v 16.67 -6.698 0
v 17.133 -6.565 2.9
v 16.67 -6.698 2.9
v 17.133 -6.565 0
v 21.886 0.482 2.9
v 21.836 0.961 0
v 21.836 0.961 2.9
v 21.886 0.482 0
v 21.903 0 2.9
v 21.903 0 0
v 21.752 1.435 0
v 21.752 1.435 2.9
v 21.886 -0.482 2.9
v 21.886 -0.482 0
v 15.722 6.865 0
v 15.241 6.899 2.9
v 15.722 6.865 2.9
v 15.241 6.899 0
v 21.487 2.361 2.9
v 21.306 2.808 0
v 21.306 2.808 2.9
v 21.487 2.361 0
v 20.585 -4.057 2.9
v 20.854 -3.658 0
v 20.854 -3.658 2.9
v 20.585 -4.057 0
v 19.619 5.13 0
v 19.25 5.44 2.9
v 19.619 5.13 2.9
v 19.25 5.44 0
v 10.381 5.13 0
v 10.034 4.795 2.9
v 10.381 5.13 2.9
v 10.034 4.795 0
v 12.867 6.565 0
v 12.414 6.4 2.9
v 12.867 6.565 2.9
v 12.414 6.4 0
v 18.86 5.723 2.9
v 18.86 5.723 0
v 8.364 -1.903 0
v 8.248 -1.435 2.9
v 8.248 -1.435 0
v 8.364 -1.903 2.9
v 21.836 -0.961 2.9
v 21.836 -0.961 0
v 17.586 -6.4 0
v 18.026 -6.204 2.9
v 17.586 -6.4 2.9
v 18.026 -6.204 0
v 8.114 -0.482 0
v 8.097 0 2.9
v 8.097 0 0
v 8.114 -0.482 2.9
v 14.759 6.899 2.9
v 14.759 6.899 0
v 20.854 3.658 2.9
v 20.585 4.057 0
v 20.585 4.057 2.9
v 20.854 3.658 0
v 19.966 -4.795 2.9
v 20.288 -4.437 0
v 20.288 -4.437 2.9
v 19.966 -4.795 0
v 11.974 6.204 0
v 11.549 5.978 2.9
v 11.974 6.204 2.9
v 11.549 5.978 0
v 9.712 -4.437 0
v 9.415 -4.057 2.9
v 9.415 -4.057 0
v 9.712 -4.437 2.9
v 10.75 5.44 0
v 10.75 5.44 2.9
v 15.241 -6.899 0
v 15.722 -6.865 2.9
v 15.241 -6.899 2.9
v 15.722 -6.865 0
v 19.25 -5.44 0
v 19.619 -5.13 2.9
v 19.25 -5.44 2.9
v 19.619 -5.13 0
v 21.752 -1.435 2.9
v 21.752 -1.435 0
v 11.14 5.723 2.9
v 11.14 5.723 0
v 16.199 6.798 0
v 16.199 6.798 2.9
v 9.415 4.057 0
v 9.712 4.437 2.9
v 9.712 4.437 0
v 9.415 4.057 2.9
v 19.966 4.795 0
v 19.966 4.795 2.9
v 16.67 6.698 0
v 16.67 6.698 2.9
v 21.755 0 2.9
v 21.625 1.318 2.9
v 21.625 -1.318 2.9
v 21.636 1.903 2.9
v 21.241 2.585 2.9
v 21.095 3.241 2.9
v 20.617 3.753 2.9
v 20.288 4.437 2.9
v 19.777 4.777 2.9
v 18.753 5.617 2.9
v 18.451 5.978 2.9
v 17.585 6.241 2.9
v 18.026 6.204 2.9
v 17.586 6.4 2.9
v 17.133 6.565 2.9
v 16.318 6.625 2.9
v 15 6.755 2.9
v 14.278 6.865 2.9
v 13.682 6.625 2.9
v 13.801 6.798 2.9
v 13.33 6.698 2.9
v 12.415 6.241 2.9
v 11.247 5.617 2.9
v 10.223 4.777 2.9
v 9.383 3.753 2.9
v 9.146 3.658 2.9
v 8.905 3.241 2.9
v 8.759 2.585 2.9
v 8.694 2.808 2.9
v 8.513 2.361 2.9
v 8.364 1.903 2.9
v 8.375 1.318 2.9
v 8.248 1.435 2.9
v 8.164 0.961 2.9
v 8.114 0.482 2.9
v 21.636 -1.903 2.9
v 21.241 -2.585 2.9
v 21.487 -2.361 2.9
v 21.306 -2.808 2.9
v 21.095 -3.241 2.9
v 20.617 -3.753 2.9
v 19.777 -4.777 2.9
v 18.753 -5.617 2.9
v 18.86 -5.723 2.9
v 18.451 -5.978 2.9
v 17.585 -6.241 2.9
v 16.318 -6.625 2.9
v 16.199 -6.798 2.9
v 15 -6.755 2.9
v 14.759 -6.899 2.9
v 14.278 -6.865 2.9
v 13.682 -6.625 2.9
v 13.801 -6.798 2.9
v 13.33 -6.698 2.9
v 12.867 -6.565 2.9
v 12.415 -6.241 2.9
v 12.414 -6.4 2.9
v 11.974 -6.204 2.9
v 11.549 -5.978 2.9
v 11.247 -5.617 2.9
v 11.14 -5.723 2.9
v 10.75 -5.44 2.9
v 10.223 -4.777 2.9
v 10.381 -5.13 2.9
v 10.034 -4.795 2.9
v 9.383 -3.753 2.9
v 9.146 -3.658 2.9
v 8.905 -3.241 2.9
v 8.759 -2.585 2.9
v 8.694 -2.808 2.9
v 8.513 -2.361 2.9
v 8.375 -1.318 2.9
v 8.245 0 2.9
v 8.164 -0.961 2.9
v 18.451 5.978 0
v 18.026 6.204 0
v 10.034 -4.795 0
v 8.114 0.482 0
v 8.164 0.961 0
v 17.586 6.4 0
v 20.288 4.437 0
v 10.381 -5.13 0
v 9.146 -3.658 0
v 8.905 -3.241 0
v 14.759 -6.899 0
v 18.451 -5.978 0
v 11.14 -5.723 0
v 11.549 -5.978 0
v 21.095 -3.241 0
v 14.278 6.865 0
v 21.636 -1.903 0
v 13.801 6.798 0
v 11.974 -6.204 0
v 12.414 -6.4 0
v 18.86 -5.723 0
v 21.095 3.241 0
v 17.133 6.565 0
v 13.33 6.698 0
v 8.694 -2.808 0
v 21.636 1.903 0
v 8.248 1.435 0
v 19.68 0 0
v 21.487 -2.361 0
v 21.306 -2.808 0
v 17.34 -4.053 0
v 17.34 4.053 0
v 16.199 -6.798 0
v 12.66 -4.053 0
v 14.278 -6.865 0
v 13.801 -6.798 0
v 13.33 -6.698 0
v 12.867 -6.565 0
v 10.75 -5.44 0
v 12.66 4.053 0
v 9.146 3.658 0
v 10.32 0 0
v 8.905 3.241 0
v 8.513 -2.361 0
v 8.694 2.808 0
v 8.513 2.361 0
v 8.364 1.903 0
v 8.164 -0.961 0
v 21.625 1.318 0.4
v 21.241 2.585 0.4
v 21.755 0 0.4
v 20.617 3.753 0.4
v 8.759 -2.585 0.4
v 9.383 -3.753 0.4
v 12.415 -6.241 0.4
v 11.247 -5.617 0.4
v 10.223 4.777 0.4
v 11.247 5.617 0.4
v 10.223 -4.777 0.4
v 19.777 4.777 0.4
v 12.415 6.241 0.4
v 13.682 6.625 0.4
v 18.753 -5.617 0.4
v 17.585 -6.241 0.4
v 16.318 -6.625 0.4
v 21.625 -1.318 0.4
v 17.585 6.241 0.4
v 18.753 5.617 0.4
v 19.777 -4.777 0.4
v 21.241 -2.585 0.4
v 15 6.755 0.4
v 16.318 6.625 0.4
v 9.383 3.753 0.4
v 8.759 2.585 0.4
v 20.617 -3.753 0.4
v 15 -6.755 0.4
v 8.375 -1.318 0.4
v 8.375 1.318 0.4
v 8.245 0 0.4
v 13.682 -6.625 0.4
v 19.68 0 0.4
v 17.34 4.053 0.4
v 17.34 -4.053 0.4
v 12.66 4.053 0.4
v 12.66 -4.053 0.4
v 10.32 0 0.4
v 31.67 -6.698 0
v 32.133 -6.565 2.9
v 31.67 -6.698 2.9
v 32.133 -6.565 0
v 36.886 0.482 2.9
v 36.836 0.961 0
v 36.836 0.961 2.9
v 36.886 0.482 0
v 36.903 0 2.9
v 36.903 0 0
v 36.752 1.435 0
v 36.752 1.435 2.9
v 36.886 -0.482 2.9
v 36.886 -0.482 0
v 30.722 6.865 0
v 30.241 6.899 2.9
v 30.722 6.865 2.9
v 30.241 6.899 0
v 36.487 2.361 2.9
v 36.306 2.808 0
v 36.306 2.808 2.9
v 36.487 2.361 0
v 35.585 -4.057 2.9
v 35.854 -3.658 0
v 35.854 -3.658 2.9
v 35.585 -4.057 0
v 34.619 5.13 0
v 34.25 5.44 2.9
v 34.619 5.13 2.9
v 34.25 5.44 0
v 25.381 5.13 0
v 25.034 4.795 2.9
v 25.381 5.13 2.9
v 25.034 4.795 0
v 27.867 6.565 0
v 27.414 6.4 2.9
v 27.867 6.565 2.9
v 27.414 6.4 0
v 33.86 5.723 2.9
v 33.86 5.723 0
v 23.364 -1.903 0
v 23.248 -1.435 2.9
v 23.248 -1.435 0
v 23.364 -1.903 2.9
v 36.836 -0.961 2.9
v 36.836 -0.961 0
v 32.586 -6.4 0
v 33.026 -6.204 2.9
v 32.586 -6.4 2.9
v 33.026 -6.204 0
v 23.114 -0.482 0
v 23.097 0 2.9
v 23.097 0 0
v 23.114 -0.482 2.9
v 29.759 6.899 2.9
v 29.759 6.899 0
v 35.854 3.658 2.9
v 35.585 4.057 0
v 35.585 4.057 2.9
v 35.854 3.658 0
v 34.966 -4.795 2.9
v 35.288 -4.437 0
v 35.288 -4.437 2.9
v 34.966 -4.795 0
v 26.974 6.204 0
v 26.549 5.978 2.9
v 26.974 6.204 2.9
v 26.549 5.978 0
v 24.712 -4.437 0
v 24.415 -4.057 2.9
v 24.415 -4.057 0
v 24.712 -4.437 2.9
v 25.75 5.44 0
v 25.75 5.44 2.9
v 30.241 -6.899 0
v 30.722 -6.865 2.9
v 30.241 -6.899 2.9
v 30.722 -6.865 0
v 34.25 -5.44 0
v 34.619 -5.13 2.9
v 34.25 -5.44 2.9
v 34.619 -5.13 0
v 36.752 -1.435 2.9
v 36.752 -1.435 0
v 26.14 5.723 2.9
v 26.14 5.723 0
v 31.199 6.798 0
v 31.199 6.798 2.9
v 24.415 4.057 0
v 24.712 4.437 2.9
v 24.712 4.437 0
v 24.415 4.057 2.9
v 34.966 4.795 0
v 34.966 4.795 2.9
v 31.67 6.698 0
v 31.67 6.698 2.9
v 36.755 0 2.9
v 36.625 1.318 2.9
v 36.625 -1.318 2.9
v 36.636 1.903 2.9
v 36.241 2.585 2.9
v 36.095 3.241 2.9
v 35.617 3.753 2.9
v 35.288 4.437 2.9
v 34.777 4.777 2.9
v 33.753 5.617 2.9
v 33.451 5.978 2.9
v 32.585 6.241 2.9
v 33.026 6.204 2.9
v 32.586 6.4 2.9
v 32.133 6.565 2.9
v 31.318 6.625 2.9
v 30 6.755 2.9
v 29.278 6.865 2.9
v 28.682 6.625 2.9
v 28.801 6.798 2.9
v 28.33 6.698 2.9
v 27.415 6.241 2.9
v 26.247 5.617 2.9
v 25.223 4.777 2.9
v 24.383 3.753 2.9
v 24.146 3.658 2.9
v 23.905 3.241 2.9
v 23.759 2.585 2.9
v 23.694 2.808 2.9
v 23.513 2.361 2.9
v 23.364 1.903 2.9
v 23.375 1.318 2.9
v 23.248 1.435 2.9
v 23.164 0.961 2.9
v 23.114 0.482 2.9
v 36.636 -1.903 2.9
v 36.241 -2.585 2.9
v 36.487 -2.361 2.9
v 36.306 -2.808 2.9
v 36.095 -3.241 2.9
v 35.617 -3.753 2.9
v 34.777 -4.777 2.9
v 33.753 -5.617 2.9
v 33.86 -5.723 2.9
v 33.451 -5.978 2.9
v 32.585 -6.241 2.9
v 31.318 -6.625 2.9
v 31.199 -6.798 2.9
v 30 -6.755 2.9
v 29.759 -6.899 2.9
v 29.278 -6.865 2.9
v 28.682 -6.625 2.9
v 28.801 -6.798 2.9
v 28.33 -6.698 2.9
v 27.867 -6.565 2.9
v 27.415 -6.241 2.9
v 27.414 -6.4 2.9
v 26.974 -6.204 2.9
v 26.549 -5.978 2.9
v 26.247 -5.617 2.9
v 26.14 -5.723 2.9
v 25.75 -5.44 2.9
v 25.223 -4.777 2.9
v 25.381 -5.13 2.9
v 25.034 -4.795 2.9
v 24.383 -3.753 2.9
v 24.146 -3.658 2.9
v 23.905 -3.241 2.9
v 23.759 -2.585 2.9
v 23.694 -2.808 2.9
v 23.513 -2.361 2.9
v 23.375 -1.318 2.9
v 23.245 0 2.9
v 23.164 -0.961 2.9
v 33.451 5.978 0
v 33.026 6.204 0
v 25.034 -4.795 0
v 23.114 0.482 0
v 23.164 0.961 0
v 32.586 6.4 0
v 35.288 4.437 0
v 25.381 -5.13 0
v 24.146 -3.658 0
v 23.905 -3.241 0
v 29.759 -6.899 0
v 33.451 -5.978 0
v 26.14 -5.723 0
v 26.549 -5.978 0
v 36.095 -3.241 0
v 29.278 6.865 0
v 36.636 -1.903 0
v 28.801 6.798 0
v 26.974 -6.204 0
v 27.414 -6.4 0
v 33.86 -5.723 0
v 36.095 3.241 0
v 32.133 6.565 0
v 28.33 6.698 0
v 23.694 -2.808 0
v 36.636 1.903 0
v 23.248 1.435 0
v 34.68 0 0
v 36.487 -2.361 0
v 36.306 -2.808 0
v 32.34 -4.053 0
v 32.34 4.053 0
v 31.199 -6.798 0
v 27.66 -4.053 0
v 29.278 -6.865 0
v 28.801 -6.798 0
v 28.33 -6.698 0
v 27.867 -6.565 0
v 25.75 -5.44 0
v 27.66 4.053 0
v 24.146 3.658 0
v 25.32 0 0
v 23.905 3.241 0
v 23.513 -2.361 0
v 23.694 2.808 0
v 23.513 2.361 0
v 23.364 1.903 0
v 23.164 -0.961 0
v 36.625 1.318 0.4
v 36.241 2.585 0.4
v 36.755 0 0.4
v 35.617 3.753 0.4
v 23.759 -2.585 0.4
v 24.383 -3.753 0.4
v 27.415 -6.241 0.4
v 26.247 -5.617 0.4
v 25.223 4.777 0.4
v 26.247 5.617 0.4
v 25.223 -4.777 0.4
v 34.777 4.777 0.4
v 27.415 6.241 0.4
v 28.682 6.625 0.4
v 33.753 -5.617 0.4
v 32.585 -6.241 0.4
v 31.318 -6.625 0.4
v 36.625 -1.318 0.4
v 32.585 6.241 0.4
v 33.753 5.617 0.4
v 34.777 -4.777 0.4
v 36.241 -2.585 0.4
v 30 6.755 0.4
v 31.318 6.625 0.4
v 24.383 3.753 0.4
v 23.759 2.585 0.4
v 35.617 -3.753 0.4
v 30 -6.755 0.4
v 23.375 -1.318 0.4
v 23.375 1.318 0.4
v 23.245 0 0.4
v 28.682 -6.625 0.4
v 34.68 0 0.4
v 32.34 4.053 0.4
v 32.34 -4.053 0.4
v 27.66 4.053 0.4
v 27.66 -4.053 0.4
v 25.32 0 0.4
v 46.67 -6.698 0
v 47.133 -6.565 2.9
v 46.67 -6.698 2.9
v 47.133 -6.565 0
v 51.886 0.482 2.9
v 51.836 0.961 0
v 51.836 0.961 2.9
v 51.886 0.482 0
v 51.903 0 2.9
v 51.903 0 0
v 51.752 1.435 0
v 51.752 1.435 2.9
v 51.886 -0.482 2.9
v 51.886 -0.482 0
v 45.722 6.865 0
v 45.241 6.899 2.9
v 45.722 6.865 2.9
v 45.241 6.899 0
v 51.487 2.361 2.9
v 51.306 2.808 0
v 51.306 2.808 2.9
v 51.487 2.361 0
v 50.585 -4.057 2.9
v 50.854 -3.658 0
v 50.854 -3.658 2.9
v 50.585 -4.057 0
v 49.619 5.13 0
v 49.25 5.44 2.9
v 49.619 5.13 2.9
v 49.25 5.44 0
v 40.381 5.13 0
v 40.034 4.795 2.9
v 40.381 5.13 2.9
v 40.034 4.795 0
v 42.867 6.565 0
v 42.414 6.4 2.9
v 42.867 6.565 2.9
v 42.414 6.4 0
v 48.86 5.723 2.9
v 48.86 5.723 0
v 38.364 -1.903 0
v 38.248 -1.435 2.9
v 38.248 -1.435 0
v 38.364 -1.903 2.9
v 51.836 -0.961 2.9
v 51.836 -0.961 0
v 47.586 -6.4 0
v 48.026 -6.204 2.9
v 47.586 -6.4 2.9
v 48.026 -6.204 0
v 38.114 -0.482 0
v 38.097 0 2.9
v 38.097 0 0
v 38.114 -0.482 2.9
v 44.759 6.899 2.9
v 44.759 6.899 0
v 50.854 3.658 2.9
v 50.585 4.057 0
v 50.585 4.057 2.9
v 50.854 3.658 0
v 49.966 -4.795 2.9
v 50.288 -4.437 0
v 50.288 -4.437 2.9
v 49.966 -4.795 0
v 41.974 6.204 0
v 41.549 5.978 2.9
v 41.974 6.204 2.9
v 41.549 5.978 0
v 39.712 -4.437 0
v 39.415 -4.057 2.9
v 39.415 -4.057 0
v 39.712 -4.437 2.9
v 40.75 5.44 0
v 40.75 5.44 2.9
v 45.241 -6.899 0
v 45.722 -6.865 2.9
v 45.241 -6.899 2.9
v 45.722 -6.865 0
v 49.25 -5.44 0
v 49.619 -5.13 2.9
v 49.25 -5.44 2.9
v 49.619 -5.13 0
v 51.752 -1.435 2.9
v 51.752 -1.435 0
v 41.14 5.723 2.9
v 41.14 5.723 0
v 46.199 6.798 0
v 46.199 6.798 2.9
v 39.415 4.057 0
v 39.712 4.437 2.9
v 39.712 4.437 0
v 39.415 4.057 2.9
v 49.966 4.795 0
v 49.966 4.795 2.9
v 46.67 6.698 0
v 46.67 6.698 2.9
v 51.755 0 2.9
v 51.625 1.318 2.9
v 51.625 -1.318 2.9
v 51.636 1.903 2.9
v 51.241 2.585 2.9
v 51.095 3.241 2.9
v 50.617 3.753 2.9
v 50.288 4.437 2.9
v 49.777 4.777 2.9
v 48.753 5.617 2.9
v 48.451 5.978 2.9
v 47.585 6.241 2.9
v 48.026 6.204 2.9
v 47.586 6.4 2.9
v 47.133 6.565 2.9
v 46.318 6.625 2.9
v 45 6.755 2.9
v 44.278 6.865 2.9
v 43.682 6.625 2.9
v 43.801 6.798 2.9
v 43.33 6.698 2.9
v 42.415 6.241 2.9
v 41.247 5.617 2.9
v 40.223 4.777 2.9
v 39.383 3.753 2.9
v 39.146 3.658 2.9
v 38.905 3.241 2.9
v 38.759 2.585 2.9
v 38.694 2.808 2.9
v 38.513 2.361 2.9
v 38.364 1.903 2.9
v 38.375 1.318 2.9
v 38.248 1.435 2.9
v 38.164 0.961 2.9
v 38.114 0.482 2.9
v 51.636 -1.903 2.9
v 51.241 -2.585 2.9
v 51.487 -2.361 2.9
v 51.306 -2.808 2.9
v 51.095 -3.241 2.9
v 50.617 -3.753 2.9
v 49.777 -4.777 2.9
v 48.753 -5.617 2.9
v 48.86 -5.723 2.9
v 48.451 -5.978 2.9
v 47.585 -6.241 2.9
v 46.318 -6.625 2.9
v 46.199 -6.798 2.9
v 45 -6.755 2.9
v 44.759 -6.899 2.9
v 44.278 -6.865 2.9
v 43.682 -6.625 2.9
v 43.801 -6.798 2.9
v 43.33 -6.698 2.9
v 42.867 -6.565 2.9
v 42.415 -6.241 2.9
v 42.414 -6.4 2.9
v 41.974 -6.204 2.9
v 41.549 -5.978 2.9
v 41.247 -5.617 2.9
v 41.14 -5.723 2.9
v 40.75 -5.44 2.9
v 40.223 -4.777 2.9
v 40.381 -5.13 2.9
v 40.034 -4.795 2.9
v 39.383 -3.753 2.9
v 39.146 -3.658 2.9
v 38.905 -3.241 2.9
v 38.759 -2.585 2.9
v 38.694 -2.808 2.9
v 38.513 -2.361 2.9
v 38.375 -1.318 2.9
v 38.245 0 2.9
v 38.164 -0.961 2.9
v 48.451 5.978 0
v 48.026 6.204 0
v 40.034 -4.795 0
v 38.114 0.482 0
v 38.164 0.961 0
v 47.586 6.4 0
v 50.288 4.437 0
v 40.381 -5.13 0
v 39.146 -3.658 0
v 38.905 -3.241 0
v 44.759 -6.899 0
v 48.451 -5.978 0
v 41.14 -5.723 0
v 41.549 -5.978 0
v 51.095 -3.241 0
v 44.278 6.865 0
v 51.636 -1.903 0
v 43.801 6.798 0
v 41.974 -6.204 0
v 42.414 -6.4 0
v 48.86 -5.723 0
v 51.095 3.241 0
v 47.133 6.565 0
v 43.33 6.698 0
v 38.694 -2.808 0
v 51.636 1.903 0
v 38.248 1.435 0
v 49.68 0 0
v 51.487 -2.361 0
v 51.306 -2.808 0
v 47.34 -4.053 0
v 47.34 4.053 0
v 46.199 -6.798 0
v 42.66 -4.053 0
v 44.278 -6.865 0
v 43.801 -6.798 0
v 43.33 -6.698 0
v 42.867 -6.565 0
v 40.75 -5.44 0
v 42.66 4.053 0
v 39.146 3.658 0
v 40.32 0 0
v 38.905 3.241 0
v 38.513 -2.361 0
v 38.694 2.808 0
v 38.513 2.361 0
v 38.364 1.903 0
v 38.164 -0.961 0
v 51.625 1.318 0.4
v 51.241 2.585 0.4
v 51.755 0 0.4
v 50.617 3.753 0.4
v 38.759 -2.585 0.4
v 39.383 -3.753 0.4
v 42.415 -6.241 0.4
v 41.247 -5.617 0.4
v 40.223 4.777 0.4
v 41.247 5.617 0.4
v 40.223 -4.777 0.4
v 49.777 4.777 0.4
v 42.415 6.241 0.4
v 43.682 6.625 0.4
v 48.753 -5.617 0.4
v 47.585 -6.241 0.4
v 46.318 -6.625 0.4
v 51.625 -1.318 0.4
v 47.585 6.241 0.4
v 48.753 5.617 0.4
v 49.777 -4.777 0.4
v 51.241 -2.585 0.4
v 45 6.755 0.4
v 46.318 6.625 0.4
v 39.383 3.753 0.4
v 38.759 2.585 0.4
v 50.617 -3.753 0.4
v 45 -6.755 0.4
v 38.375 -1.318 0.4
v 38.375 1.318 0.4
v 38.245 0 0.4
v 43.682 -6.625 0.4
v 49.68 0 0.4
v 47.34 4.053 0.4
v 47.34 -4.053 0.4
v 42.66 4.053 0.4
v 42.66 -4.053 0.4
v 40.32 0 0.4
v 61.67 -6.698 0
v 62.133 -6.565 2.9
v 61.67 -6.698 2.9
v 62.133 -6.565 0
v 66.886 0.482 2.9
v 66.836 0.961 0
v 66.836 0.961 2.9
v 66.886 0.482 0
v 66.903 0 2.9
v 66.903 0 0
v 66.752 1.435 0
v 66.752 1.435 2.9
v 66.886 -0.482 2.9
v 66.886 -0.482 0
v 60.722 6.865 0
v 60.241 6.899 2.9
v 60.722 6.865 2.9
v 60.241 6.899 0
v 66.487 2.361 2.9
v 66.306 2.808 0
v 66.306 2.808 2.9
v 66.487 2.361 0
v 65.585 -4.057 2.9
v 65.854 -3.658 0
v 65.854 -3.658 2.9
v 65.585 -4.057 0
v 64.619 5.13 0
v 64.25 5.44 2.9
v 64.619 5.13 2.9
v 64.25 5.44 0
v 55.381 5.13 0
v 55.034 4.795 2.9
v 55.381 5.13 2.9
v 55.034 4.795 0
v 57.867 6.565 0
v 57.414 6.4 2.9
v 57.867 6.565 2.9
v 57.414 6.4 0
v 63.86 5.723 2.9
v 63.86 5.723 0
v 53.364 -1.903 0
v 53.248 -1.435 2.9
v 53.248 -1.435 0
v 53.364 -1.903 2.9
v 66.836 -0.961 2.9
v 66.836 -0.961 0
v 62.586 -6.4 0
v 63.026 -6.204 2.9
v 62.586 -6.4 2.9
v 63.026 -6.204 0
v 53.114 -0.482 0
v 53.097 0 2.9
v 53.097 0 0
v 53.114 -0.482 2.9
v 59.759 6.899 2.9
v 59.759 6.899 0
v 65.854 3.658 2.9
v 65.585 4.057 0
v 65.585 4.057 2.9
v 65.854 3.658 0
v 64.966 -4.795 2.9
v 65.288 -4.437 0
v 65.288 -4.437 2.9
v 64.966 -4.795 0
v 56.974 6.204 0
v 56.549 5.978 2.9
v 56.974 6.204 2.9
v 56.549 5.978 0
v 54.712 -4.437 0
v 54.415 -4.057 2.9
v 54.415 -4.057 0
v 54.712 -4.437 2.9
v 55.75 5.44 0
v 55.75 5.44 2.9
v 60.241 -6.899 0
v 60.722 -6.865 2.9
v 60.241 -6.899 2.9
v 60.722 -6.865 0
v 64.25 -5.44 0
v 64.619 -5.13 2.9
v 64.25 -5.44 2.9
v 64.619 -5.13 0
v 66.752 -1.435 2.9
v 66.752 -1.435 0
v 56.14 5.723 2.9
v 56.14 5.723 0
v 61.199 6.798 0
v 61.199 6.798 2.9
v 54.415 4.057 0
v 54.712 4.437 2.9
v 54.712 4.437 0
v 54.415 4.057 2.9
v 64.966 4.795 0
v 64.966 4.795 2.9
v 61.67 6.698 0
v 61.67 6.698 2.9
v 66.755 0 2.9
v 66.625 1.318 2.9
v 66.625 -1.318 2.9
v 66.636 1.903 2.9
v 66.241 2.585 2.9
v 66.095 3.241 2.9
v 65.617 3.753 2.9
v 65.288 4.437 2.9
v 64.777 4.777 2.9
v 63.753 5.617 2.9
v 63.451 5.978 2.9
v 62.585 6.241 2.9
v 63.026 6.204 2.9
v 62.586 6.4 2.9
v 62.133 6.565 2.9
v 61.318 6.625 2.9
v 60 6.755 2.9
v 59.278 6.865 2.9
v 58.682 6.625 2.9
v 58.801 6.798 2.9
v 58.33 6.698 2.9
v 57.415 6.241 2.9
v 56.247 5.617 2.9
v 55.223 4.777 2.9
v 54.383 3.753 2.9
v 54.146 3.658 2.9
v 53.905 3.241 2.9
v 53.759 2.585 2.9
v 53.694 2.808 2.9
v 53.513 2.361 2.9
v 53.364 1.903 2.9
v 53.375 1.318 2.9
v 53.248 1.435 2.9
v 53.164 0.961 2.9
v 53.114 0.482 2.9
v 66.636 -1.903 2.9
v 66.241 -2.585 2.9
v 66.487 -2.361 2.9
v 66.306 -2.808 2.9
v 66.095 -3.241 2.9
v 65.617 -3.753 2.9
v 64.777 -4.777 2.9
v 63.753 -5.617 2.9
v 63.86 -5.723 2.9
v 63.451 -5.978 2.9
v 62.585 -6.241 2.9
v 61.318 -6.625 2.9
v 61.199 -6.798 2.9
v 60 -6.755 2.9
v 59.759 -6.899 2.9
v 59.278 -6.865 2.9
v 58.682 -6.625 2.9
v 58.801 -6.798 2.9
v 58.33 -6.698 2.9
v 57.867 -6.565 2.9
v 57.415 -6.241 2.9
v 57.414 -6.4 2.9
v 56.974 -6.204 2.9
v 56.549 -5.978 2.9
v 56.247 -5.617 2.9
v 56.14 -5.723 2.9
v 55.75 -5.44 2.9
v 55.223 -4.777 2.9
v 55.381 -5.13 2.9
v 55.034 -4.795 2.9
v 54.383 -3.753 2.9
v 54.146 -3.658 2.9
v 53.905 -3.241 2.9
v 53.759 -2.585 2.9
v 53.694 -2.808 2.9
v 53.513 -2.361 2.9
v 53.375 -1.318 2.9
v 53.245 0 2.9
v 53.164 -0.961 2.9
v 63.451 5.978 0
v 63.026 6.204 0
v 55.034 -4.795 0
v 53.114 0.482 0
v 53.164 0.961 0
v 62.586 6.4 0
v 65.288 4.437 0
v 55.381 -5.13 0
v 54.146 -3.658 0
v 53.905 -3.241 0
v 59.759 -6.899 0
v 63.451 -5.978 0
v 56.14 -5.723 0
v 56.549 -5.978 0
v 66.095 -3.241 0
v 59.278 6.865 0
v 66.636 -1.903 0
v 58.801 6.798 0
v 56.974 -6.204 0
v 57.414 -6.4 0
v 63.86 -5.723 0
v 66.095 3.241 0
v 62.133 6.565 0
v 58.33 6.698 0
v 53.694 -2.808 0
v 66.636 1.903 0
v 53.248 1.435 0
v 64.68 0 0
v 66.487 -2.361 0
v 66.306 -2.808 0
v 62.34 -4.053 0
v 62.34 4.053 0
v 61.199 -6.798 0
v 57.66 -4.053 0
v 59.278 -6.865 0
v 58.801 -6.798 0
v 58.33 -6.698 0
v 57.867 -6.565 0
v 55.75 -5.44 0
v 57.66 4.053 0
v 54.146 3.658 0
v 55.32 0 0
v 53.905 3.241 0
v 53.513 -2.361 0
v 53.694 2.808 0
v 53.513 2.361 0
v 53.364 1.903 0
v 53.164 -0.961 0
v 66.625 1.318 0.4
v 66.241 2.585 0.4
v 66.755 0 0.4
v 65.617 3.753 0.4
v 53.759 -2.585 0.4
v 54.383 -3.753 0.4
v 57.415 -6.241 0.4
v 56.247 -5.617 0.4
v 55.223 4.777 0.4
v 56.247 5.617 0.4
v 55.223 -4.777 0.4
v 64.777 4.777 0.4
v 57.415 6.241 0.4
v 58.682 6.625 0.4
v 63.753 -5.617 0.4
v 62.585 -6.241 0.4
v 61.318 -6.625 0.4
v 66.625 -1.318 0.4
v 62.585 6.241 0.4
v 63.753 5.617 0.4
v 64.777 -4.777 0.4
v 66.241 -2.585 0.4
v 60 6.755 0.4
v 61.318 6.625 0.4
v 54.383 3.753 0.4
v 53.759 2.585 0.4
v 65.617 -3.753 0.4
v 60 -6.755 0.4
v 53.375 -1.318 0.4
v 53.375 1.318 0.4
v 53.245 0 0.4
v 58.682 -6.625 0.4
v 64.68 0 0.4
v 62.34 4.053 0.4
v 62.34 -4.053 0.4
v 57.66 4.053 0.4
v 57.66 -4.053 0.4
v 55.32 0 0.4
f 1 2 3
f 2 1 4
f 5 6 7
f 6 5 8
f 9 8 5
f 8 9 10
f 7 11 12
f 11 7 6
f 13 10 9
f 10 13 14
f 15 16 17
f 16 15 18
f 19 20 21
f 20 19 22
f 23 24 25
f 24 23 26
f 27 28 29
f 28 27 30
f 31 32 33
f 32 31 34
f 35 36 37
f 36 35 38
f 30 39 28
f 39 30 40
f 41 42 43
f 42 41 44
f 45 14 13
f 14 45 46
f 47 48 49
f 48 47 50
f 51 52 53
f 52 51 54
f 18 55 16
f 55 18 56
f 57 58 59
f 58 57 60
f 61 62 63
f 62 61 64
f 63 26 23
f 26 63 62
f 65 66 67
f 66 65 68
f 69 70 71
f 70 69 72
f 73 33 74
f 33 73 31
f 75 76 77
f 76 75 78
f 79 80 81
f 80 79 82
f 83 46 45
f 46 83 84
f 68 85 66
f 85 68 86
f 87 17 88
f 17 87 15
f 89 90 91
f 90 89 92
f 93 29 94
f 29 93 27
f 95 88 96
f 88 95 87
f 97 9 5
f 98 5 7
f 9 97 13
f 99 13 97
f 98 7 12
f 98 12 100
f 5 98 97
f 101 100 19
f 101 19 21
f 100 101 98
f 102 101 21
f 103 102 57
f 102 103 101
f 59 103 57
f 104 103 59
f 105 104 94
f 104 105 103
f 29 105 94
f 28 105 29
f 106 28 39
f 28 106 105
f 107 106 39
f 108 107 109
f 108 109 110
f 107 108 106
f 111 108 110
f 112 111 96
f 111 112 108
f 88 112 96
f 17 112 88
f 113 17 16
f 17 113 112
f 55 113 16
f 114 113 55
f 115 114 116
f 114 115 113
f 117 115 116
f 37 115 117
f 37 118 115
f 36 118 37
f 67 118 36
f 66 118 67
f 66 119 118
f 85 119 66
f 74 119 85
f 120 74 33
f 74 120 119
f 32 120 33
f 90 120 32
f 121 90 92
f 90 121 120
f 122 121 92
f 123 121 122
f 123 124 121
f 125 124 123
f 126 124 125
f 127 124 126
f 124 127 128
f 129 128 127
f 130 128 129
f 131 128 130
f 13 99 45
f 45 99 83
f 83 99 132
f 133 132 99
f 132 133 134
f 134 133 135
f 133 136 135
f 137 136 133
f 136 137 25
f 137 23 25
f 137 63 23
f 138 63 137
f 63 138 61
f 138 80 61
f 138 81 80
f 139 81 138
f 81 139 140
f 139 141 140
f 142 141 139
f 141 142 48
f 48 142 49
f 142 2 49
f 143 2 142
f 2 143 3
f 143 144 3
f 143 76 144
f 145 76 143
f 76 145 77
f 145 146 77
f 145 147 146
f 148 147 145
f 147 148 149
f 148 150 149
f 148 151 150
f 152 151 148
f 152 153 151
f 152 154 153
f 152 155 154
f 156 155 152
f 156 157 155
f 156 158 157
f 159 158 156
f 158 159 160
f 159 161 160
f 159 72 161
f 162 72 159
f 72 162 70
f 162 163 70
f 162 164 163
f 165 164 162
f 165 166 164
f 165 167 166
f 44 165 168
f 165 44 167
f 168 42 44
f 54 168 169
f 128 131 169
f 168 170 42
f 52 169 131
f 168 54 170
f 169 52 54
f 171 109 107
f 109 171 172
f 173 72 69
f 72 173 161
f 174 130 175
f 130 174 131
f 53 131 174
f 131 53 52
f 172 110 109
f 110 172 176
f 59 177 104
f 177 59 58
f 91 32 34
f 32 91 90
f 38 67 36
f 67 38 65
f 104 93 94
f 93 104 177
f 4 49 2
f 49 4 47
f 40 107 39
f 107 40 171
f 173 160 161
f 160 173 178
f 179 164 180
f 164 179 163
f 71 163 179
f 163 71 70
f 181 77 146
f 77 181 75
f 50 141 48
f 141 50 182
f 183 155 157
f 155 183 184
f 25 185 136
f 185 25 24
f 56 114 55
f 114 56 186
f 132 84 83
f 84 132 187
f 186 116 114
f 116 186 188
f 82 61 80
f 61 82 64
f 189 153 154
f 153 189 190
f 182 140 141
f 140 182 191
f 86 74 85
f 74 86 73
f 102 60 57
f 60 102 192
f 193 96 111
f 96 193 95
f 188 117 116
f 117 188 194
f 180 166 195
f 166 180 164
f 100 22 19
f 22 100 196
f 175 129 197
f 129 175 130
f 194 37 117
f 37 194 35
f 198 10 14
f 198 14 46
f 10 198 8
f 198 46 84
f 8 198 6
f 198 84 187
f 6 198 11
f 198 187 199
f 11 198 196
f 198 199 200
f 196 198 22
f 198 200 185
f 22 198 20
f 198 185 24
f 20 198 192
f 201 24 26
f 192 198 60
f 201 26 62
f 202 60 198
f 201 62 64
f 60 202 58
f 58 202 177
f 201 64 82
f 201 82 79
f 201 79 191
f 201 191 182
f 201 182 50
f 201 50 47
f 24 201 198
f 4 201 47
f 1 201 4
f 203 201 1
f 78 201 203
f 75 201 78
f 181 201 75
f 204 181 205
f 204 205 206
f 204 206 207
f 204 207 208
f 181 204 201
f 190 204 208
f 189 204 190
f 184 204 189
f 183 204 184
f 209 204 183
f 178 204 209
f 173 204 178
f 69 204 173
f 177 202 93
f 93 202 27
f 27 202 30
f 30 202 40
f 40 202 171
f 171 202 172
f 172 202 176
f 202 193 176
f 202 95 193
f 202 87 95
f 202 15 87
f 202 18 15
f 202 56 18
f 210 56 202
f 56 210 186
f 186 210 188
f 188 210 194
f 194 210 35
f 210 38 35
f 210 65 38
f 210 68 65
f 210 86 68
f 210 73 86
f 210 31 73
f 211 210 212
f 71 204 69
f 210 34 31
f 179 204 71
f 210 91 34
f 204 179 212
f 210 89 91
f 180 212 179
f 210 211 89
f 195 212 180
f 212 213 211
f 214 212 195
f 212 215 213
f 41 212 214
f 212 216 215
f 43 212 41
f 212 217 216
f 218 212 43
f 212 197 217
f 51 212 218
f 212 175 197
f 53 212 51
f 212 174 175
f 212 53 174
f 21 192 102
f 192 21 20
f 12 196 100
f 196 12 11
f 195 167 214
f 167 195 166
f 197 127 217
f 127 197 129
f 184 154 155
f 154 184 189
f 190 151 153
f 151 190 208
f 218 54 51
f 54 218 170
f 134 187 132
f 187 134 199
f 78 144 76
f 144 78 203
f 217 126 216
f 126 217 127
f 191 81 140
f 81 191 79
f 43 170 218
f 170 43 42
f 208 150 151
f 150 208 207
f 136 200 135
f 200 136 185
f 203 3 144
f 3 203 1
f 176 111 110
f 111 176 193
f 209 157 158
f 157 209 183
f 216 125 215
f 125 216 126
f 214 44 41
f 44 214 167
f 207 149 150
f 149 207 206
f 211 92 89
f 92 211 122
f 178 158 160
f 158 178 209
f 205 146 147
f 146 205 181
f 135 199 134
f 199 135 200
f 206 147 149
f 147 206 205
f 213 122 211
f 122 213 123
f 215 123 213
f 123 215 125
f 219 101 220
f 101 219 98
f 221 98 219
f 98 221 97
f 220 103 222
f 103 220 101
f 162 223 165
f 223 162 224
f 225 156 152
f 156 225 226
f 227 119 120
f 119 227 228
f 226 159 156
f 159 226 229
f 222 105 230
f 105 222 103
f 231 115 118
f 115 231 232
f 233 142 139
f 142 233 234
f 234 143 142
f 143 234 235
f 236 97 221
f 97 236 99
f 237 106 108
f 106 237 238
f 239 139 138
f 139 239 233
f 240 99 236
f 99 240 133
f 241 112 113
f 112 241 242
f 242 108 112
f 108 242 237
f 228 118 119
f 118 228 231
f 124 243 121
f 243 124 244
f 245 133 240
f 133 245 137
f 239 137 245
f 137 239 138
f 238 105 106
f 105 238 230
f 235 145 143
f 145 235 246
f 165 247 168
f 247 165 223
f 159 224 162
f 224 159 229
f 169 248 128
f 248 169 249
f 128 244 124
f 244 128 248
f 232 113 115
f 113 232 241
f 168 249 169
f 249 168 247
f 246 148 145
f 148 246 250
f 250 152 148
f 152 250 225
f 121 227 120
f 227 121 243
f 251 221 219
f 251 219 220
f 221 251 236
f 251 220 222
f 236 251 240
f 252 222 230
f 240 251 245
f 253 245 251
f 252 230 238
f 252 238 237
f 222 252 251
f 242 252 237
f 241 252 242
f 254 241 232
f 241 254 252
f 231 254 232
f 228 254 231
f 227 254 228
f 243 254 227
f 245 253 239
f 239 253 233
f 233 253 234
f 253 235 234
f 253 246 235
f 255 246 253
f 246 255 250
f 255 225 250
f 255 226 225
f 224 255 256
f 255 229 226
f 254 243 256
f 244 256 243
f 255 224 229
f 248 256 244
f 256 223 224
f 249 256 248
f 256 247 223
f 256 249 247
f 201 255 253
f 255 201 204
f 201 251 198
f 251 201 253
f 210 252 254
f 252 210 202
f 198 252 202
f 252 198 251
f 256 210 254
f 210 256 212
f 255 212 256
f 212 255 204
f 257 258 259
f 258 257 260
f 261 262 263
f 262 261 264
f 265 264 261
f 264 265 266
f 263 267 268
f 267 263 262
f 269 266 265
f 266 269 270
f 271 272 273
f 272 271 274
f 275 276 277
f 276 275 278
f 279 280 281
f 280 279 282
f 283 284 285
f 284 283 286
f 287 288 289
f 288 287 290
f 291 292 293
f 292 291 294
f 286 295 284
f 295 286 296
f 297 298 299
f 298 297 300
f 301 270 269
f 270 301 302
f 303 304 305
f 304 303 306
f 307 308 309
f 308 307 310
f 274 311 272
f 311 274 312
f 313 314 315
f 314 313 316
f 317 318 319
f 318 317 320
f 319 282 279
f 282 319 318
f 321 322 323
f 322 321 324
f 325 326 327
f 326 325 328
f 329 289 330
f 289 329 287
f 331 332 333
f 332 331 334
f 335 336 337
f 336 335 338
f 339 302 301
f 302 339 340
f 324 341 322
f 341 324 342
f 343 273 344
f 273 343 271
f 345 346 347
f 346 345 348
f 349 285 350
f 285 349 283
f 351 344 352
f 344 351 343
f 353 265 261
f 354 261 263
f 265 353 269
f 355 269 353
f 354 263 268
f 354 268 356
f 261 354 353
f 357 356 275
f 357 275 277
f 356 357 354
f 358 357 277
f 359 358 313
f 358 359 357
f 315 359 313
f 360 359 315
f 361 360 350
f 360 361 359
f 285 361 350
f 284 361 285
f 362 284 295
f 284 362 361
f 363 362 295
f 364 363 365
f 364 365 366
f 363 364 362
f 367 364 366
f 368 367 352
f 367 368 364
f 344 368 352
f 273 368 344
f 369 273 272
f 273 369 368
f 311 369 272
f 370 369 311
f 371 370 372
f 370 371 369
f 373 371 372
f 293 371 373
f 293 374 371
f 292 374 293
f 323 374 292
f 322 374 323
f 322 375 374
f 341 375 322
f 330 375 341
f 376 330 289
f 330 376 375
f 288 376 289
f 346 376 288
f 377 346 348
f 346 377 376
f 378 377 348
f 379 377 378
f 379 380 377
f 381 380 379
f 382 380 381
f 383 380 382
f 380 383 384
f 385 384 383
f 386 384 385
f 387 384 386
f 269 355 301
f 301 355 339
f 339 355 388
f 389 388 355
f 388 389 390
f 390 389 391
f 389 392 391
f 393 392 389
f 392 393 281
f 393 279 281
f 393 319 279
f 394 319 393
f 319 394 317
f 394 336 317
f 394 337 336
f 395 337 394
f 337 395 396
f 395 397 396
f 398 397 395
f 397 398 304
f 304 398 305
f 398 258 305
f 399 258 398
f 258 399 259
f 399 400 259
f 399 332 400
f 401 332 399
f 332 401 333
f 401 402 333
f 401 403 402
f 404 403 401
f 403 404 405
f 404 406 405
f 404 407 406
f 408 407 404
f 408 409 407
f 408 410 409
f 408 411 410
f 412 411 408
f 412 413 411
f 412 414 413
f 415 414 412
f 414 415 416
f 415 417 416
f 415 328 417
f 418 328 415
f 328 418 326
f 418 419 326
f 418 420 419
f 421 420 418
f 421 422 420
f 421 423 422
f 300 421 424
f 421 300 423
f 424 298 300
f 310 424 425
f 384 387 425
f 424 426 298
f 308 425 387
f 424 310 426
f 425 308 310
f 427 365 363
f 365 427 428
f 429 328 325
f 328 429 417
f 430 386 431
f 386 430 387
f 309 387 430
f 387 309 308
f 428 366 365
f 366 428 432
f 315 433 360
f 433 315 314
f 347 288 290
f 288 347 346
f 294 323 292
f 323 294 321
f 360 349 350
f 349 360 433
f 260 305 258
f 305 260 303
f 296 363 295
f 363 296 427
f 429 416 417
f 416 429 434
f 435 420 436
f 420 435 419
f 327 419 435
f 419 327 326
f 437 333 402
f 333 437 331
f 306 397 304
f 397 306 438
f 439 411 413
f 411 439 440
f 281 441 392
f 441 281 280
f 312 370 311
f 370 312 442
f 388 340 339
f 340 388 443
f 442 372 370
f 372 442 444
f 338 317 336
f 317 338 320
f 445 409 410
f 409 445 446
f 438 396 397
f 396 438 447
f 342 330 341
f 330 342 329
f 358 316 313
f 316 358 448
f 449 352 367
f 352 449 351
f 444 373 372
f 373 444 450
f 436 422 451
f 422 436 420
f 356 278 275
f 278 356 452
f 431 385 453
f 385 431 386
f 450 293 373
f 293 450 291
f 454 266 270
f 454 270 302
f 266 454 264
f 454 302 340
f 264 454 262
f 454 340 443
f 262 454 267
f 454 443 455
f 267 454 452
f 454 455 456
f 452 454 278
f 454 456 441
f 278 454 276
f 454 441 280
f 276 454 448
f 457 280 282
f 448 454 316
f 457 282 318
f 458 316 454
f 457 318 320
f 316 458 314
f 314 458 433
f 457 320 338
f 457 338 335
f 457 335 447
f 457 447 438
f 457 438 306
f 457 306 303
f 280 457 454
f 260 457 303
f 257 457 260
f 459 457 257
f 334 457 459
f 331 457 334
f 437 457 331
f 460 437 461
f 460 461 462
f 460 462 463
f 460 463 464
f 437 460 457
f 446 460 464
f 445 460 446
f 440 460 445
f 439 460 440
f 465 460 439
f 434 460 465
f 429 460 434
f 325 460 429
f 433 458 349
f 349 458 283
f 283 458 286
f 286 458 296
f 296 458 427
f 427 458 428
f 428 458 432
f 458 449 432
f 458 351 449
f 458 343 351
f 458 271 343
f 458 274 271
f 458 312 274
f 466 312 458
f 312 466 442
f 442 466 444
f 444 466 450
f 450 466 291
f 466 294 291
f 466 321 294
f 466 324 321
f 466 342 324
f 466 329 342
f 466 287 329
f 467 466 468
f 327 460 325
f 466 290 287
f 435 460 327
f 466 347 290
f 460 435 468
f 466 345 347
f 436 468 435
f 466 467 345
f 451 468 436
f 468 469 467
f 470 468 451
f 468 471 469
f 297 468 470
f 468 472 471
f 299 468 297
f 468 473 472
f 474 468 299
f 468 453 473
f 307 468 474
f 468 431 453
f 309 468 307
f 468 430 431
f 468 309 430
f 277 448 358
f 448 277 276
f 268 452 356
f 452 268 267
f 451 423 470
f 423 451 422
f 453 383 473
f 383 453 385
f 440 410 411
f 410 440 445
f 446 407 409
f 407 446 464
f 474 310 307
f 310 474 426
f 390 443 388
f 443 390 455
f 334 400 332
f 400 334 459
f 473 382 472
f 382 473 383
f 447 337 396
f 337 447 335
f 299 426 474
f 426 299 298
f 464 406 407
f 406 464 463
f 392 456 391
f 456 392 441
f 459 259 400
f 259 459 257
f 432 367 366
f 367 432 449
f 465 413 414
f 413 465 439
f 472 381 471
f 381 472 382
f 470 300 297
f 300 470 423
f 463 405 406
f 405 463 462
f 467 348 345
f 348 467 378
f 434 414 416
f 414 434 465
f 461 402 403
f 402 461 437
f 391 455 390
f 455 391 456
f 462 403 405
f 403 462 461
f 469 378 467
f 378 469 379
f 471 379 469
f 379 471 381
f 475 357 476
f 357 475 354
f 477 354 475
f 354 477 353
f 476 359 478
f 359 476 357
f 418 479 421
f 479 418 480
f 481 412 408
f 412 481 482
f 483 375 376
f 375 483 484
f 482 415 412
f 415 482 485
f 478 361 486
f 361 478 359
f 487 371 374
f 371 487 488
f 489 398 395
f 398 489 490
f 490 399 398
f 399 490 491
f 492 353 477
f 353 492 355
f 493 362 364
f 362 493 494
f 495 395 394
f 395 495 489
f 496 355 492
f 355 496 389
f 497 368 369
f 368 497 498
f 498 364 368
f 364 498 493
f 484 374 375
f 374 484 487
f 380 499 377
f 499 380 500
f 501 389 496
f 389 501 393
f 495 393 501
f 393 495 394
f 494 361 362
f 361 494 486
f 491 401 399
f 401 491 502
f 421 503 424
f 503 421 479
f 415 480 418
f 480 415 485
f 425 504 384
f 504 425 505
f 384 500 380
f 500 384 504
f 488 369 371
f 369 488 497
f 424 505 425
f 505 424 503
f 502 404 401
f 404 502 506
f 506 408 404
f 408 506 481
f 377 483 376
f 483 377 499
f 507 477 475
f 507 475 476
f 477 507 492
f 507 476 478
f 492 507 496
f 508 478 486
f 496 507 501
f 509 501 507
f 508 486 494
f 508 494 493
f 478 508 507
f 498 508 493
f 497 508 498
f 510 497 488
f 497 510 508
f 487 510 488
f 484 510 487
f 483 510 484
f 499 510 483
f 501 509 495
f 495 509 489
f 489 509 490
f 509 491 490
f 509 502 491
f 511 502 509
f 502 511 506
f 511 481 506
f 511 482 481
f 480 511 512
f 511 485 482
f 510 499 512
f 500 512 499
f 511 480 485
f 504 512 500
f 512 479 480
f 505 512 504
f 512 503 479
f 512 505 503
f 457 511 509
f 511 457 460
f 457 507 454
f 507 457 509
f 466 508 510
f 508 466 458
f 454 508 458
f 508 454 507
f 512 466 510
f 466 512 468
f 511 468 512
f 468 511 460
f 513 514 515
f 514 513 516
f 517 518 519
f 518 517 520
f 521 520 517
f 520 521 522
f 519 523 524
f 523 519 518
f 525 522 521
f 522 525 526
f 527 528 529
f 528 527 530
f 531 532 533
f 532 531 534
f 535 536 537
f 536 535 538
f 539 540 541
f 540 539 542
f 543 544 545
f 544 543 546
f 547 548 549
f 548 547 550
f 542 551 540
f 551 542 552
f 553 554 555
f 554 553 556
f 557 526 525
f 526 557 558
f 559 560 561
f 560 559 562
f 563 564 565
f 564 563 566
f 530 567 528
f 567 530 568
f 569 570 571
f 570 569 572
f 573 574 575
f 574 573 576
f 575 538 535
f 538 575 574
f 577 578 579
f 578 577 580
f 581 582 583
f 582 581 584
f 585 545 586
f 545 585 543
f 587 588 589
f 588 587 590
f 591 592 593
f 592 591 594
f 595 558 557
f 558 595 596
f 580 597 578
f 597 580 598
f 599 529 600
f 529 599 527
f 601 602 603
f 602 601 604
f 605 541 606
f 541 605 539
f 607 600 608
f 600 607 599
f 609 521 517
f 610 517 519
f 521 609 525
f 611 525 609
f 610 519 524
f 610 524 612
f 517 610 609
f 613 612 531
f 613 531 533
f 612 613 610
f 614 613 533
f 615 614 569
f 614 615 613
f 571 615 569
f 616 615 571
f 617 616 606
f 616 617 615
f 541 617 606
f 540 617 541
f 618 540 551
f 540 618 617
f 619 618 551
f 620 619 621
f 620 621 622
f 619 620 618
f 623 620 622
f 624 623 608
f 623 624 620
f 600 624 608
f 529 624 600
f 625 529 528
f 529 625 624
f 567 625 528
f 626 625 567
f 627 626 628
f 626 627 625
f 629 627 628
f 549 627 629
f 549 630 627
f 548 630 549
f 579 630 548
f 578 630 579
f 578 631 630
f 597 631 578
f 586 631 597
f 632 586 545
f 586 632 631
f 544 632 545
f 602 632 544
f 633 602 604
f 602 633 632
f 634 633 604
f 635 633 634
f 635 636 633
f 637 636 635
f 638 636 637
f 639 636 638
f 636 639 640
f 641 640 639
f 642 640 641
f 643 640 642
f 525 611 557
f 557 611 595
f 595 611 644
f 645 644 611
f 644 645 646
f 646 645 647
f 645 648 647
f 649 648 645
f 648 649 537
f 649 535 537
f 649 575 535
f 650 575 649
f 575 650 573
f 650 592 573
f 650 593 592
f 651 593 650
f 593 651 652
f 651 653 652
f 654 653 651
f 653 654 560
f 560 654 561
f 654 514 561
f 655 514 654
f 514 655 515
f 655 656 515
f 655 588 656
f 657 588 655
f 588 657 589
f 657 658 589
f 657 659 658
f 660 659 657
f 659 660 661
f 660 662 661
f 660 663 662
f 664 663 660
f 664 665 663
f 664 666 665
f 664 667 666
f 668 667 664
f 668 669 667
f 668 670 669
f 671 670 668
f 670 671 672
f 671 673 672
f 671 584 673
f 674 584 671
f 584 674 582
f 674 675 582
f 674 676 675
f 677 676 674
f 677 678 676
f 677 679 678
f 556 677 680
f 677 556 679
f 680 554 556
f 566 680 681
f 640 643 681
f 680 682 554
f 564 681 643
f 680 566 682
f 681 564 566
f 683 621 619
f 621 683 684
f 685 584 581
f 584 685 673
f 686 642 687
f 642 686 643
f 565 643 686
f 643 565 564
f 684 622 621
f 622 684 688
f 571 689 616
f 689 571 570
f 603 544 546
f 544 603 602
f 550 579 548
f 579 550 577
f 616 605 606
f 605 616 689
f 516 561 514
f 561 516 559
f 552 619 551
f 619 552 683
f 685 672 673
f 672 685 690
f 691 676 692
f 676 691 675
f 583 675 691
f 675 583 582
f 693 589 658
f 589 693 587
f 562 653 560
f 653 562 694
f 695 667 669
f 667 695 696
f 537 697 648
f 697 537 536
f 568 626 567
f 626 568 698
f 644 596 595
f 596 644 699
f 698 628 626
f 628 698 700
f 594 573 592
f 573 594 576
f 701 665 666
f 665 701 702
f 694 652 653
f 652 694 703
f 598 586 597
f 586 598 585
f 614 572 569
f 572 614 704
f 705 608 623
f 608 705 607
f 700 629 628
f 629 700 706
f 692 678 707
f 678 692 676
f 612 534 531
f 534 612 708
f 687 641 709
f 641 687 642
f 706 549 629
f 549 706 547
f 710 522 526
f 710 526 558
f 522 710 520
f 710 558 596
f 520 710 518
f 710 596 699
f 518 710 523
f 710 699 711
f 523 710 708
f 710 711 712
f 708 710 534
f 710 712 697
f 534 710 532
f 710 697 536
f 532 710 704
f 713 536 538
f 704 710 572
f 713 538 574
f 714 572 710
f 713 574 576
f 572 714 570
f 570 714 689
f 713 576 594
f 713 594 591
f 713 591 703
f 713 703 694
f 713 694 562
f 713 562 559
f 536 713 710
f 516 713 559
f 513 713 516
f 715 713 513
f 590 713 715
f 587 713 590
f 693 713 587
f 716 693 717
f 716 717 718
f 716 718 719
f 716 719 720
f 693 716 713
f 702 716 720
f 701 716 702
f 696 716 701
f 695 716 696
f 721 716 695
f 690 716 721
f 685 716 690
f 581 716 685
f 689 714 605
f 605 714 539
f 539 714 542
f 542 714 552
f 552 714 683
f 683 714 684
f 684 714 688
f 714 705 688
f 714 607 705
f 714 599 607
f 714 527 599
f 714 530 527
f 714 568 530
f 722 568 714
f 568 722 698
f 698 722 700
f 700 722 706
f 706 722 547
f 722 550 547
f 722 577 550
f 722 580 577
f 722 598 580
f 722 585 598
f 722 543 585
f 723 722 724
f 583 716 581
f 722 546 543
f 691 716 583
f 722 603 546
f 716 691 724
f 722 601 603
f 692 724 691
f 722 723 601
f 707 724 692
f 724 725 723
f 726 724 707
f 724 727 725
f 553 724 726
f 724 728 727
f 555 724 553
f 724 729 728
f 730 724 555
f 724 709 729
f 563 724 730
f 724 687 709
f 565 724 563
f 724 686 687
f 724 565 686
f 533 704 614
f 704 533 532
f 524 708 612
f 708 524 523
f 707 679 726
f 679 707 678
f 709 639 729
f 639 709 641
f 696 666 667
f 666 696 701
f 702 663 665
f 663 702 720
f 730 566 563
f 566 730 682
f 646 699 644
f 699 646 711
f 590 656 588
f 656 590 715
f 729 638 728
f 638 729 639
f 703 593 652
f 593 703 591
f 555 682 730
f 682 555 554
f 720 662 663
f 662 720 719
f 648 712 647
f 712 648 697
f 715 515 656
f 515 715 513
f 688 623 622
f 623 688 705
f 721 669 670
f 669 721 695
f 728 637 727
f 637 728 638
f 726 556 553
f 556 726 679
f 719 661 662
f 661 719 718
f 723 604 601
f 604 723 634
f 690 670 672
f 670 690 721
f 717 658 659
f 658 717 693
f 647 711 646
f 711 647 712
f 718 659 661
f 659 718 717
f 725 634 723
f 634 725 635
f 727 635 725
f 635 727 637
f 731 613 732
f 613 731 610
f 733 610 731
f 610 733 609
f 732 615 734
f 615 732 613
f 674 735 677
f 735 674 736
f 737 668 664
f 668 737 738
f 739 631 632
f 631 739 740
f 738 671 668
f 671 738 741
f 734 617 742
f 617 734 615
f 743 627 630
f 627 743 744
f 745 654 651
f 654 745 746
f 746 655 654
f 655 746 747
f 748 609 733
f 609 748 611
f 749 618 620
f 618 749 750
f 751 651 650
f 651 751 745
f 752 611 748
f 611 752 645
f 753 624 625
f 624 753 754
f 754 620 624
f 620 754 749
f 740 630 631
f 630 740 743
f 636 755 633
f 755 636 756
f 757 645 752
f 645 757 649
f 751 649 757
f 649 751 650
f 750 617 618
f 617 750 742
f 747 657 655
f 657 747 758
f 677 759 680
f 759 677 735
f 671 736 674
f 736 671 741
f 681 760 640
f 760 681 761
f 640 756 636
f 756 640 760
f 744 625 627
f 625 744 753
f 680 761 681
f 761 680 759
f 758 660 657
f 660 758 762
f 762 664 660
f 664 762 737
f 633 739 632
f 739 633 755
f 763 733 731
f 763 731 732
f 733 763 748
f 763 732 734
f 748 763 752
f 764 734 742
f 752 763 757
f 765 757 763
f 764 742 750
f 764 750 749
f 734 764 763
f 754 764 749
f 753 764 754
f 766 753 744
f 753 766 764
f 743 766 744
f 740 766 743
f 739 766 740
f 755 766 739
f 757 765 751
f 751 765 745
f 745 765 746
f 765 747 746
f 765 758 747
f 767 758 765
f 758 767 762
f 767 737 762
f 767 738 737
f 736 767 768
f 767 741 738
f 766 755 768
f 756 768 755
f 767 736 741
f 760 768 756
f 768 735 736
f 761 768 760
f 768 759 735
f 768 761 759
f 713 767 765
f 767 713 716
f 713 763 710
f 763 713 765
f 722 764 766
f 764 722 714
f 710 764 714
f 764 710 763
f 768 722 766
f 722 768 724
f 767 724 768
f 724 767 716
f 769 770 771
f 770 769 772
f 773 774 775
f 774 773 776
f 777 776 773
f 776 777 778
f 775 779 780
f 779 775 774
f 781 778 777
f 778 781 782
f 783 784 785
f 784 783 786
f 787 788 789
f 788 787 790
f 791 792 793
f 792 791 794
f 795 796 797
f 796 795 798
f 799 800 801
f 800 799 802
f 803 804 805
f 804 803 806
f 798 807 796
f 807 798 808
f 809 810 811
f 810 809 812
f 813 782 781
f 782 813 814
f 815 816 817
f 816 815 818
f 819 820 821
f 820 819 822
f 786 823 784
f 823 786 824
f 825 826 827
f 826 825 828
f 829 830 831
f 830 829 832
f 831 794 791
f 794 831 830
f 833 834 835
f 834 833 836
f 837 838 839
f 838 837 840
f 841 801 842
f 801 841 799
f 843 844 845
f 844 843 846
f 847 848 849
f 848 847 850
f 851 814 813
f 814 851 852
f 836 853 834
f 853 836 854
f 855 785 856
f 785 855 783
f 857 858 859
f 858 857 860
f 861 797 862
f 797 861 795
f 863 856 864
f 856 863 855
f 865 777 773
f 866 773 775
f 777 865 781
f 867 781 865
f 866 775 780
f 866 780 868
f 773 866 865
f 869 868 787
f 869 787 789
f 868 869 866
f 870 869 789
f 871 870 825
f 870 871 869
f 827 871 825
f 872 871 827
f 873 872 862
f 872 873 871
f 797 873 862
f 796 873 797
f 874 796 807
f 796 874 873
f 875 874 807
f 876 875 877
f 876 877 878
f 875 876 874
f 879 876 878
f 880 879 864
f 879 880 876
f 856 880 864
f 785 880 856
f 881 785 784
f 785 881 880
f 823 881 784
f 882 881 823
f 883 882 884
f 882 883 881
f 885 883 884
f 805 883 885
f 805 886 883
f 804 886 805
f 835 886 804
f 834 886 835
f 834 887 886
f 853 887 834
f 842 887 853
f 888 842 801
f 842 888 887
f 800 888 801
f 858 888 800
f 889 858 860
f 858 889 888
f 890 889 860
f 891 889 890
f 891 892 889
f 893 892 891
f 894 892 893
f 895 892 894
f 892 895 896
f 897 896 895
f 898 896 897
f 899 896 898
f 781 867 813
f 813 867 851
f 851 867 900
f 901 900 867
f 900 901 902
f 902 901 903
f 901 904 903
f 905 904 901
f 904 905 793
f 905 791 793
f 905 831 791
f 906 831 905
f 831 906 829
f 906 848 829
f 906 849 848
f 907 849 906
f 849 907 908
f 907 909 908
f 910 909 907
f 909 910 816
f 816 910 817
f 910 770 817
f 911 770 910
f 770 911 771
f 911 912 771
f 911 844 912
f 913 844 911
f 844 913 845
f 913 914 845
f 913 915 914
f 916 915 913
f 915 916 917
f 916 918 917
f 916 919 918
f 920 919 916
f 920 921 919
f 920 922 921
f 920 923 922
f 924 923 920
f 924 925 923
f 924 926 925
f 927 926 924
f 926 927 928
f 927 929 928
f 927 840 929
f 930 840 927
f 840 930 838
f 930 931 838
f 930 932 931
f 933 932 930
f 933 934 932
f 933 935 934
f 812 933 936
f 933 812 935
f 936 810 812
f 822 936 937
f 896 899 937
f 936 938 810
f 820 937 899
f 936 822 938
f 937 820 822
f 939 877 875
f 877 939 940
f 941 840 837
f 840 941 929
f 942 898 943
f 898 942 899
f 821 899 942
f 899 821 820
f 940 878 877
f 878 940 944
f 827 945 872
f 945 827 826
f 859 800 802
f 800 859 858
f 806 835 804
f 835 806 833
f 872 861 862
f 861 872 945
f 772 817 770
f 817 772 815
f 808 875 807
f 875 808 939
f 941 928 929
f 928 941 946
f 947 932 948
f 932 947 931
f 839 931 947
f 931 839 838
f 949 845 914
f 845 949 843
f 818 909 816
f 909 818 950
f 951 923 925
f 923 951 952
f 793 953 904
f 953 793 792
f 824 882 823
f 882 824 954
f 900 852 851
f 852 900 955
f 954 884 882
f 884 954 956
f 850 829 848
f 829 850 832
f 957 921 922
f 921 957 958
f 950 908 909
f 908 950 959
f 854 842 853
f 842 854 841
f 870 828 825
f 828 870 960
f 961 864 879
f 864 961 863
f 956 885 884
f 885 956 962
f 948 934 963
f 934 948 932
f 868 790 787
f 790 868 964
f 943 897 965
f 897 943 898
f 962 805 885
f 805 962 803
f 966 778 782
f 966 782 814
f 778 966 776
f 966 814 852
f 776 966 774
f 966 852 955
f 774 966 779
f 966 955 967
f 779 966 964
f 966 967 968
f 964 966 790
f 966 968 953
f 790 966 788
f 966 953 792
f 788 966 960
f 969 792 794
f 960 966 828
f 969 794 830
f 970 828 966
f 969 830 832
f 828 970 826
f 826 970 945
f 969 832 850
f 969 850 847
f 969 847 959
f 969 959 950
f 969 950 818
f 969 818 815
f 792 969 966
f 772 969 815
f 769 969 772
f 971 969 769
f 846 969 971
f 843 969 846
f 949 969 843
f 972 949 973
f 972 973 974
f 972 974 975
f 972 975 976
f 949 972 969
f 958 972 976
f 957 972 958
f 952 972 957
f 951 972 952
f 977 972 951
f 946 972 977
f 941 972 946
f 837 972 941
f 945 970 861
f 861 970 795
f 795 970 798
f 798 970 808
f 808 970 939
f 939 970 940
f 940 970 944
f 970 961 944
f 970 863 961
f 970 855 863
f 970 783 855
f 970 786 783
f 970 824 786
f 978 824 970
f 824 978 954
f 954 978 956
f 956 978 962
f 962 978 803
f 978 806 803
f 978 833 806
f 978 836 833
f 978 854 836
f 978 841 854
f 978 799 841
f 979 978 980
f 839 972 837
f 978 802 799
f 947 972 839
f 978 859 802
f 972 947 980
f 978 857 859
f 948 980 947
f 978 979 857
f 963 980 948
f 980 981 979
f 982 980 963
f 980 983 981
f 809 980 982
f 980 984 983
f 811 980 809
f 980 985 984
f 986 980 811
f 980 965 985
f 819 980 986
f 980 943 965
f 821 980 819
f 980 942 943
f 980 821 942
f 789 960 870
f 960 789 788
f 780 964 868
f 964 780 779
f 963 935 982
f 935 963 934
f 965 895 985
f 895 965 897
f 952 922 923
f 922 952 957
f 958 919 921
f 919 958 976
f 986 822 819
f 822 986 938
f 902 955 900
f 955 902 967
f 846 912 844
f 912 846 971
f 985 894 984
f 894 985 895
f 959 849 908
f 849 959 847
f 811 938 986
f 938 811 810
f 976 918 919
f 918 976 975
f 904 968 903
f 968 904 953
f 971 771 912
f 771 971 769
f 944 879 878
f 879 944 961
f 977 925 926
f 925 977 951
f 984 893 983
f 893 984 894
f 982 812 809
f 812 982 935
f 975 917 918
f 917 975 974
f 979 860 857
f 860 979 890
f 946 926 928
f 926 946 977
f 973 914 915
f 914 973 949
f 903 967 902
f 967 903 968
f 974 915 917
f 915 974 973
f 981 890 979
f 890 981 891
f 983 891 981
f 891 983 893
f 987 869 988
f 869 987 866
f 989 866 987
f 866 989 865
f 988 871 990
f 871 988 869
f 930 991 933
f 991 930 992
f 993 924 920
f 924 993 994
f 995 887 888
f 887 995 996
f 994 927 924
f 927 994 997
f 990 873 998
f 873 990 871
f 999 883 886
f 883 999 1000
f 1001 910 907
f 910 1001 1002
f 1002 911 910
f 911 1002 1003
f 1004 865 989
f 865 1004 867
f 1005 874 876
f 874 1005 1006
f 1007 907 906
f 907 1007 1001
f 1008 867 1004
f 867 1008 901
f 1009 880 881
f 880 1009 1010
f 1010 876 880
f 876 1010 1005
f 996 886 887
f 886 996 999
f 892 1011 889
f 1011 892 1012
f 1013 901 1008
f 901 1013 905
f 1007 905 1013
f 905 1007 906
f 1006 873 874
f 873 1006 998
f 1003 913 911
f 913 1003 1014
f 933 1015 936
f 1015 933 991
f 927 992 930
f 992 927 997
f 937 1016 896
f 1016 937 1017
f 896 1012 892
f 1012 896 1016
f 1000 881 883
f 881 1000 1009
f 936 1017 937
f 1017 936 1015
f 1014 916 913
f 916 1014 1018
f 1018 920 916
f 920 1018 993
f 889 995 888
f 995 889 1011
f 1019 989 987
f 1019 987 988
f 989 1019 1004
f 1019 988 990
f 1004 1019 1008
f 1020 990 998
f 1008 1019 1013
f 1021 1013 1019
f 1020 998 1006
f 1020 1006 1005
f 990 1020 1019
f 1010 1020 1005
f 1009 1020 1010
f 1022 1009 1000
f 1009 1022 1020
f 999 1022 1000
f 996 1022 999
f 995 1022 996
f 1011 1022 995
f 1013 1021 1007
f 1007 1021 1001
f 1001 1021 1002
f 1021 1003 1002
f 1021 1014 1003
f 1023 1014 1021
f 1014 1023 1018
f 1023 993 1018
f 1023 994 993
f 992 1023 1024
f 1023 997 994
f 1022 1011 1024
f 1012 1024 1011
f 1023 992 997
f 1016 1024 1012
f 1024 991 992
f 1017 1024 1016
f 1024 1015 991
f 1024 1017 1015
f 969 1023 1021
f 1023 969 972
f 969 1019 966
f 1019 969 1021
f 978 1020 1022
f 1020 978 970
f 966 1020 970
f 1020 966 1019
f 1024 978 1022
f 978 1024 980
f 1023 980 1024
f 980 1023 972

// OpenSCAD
// Program:    15mm_washer_cap.scad
//
// Function: OpenSCAD program to define a plastic washer cap for
//           3D-print.
//
// Author:   Kjell Arne Rekaa (kjell.arne.rekaa@gmail.com)
// 
// Date:     2024-05-18
// ======================================================================

// Speed up rendering - low resolution only for preview: 
$fn = $preview ? 32 : 90; 

count      = 4;              // Number of caps
hole_diam  = 8;
wash_size  = 14.7;           // Washer size in millimeter
wash_size  = 10.0;           // Washer size in millimeter
distance   = 1.50;           // Distance factor between caps
wash_hight  = 2.9;           // Hight for the nut/bolt head
friction   = 1.170;          // Friction factor. Higher: less friction
cyl_thick  = 1.18;           // Cylinder thickness: 1.28 > 1.30
size = wash_size * friction; // Will give right friction


// hexagon carving to fit on a nut or bolt head
module washer(size, height=wash_hight){
    cylinder(h=height, d=size/cos(180/6),center=true, $fn=32);
}

// Produce "count" number of equal caps:
for (i = [1:1:count]) {
  translate([i*distance*wash_size,0,0]) {   
    difference() {
      union() {
        difference(){
            cylinder(h=wash_hight, d=size*cyl_thick);
            washer(size, wash_hight+5);
        }
        cylinder(h=wash_hight-2.5, d=size*cyl_thick);
      }
    cylinder(h=wash_hight+6, d=hole_diam*friction, $fn=6);
    }
  }
}
